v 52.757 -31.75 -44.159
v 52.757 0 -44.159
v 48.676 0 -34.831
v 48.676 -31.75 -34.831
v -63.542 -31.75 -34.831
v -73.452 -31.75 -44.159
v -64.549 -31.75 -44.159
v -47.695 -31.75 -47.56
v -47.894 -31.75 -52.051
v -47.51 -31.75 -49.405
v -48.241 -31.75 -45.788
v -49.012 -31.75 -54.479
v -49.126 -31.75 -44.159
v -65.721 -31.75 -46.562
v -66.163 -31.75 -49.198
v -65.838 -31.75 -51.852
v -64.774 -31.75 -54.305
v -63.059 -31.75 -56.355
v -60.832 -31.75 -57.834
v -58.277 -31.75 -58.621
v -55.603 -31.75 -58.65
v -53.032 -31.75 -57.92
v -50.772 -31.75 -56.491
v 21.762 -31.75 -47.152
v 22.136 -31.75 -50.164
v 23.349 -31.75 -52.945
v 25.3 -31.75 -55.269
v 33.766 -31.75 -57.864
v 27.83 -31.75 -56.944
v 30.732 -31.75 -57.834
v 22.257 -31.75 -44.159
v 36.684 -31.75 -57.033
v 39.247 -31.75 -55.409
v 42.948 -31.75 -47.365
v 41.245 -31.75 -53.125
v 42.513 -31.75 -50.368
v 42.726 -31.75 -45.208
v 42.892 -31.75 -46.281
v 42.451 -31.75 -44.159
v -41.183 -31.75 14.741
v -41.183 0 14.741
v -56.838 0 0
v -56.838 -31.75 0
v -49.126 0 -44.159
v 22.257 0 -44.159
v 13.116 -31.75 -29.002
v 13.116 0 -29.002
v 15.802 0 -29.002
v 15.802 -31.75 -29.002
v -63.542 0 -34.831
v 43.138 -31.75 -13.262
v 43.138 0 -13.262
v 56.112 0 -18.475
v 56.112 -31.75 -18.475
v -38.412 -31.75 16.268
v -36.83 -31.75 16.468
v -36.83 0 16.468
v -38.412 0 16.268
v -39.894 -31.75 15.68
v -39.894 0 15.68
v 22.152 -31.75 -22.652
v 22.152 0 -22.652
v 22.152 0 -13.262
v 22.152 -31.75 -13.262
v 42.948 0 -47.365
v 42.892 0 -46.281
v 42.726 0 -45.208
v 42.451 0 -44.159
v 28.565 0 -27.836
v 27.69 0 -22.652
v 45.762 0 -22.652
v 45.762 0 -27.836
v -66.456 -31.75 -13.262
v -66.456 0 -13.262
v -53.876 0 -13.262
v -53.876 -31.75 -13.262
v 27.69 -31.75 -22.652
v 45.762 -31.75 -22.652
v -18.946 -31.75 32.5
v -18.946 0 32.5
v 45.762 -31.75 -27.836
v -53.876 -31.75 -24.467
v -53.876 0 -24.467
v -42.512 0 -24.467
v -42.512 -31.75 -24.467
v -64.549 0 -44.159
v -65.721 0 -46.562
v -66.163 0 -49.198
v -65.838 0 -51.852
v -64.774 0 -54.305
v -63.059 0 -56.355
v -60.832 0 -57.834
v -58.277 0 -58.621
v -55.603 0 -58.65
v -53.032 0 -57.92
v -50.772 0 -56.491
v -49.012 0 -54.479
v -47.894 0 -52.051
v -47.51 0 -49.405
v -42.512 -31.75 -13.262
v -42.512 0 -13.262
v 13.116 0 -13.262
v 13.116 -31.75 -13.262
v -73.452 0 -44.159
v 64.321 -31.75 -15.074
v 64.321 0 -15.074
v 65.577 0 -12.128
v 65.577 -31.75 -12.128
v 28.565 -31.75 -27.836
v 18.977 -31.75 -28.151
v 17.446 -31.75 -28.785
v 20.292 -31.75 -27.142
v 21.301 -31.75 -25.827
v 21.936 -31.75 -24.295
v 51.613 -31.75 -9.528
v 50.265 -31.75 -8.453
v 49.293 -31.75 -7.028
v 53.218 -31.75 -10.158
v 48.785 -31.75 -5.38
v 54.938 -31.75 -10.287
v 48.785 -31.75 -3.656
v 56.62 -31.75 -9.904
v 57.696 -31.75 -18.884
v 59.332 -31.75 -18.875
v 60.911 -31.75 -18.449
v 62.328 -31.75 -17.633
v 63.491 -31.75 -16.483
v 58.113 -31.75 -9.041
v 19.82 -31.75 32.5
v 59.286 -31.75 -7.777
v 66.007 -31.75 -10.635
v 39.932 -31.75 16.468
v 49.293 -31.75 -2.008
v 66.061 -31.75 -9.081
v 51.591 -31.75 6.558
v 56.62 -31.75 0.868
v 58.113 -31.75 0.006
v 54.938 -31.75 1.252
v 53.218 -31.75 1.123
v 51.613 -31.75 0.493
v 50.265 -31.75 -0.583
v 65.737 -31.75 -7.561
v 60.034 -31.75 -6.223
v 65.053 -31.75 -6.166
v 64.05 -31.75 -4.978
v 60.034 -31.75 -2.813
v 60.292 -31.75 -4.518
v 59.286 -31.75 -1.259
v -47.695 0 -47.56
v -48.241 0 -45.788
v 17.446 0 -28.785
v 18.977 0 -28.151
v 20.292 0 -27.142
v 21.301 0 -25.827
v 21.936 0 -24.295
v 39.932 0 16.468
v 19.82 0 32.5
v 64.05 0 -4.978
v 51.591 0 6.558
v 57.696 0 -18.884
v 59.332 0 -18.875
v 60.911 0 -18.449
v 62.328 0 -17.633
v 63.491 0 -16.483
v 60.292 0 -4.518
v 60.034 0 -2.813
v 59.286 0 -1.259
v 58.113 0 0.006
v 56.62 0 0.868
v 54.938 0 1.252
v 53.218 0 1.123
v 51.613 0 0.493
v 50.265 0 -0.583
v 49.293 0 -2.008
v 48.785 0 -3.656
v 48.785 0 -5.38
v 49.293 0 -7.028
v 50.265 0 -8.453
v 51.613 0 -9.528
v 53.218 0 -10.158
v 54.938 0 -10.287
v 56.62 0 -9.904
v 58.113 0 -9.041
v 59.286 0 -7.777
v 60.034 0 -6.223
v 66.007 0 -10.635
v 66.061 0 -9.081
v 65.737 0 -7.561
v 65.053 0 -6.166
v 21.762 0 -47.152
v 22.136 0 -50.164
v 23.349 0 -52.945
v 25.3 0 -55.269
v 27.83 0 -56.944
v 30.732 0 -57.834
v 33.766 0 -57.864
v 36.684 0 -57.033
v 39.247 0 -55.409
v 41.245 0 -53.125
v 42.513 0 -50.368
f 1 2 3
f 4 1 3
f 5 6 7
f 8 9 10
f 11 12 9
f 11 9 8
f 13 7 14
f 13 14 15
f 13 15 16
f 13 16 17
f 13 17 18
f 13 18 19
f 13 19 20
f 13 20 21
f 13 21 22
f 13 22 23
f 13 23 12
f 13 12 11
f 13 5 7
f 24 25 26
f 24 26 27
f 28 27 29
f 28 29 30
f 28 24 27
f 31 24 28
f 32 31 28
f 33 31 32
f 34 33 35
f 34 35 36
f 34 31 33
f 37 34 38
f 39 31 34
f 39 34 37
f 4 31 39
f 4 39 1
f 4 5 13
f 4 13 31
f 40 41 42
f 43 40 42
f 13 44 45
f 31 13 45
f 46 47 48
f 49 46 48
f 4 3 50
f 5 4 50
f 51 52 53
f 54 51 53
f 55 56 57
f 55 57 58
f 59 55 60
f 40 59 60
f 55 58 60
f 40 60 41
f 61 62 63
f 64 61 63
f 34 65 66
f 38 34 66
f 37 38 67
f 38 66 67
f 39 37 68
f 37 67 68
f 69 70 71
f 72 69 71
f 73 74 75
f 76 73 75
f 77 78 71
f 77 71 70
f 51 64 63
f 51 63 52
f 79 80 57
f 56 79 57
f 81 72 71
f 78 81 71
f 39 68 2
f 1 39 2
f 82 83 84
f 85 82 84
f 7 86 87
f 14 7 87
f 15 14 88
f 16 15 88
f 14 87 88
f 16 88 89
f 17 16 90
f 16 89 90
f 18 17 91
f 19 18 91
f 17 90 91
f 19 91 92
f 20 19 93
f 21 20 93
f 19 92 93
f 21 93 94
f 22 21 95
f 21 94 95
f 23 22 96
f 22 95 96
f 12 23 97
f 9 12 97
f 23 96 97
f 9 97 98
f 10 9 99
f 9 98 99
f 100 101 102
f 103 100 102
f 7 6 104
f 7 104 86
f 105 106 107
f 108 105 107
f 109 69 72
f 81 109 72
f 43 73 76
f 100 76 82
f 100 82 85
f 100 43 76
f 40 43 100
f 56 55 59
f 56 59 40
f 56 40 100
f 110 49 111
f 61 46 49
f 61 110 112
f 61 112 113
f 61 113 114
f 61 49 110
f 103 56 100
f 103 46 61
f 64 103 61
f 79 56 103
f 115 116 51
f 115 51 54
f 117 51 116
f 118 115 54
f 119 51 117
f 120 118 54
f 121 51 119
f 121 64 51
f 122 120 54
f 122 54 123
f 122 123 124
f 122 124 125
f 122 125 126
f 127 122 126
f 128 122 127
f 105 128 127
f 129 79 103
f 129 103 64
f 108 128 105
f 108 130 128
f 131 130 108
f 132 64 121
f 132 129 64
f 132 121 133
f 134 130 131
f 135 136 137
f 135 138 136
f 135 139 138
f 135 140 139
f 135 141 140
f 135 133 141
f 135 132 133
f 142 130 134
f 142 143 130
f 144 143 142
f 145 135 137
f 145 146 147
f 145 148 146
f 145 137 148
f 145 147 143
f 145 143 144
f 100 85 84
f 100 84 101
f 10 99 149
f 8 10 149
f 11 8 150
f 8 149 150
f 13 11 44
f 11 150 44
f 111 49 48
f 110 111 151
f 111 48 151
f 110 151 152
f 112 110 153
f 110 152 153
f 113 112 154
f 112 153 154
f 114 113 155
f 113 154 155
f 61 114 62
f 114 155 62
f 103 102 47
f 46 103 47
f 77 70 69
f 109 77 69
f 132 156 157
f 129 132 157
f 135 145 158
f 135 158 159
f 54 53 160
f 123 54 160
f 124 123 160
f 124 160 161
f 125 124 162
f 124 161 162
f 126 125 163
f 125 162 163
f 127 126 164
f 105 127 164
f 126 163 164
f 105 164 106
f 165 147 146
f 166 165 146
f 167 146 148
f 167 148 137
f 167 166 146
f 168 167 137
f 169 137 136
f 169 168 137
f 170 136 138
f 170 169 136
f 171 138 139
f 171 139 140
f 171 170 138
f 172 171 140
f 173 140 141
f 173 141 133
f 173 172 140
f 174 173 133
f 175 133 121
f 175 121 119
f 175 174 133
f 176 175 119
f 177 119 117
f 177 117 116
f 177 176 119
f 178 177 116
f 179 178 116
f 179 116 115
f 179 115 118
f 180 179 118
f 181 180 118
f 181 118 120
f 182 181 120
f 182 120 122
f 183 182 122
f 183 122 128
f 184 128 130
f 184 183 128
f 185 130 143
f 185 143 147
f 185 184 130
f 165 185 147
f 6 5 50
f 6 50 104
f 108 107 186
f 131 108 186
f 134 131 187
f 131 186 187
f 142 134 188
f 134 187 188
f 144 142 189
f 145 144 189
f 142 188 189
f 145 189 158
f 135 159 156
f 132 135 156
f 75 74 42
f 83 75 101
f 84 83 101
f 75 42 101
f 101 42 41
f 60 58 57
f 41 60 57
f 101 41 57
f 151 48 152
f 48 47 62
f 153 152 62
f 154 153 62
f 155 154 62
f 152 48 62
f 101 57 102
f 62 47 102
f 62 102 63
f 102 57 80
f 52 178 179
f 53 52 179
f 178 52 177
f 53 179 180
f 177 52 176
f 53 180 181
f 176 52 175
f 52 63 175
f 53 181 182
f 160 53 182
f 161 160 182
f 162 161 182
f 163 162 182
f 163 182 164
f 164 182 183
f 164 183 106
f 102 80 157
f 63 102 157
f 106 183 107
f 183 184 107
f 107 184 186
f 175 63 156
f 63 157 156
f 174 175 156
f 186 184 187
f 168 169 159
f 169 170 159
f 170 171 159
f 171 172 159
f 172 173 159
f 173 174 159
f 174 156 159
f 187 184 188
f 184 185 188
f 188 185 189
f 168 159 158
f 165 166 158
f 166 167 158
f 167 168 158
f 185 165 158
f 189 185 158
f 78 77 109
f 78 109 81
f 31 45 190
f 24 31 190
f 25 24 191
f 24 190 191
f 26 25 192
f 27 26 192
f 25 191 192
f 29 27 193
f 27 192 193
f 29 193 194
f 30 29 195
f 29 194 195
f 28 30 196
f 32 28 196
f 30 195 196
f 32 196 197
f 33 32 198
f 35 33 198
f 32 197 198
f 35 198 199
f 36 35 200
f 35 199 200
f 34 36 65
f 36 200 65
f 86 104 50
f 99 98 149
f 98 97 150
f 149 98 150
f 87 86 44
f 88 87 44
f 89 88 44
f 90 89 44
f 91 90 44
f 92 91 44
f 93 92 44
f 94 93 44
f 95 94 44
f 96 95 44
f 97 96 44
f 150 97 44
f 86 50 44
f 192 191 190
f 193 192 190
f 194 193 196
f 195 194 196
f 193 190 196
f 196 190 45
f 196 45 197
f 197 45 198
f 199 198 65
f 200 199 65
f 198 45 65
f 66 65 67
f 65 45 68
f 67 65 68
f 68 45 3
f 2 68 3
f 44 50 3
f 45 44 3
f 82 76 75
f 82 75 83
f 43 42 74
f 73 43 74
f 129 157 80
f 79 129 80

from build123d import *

# Parameters (mm, degrees)
F0_R     = 5.7856185804
F1_DEPTH = 31.75


with BuildPart() as f1:
    # F0 (on Front) → F1 (new body)
    with BuildSketch(Plane.XZ):
        Polygon((-18.945902586, 32.4995070696), (-36.8299595613, 16.4683610201), (-21.8606572598, 16.4683610201), align=None)
        with BuildLine():
            Line((-21.8606572598, 16.4683610201), (-36.8299595613, 16.4683610201))
            ThreePointArc((-36.8299595613, 16.4683610201), (-39.1716298113, 16.0208249497), (-41.1832270213, 14.7412997414))
            Line((-41.1832270213, 14.7412997414), (-56.8377040327, 0))
            Line((-56.8377040327, 0), (-31.4793474972, 0))
            Line((-31.4793474972, 0), (-21.8606572598, 16.4683610201))
        make_face()
        Polygon((-18.945902586, 32.4995070696), (-21.8606572598, 16.4683610201), (0, 16.4683610201), (0, 32.4995070696), align=None)
        Polygon((0, 32.4995070696), (0, 16.4683610201), (18.9459007233, 16.4683610201), (19.8203269392, 32.4995070696), align=None)
        Polygon((-38.1832793355, -13.2621303201), (-31.4793474972, 0), (-56.8377040327, 0), (-66.4563924074, -13.2621303201), (-53.8759827614, -13.2621303201), (-53.8759827614, -24.4669094682), (-42.5122864544, -24.4669094682), (-42.5122864544, -13.2621303201), align=None)
        Polygon((-5.5380342528, 0), (-31.4793474972, 0), (-38.1832793355, -13.2621303201), (-11.6590168327, -13.2621303201), align=None)
        Polygon((19.8203269392, 32.4995070696), (18.9459007233, 16.4683610201), (39.9321317673, 16.4683610201), align=None)
        Polygon((39.9321317673, 16.4683610201), (18.9459007233, 16.4683610201), (14.8652456701, 0), (37.6003272831, 0), align=None)
        Polygon((14.8652456701, 0), (-5.5380342528, 0), (-11.6590168327, -13.2621303201), (13.1163932383, -13.2621303201), align=None)
        Polygon((51.5911467373, 6.5581966192), (39.9321317673, 16.4683610201), (37.6003272831, 0), (47.0716502985, -4.0392414176), align=None)
        with BuildLine():
            Line((37.6003272831, 0), (14.8652456701, 0))
            Line((14.8652456701, 0), (13.1163932383, -13.2621303201))
            Line((13.1163932383, -13.2621303201), (13.1163932383, -29.0018040687))
            Line((13.1163932383, -29.0018040687), (15.8021295607, -29.0018040687))
            ThreePointArc((15.8021295607, -29.0018040687), (20.2922576212, -27.1419321292), (22.1521295607, -22.6518040687))
            Line((22.1521295607, -22.6518040687), (22.1521295607, -13.2621303201))
            Line((22.1521295607, -13.2621303201), (37.6003272831, -13.2621303201))
            Line((37.6003272831, -13.2621303201), (37.6003272831, 0))
        make_face()
        with BuildLine():
            Line((64.0501111657, -4.9778790706), (51.5911467373, 6.5581966192))
            Line((51.5911467373, 6.5581966192), (47.0716502985, -4.0392414176))
            Line((47.0716502985, -4.0392414176), (43.138358742, -13.2621303201))
            Line((43.138358742, -13.2621303201), (56.1124610001, -18.4747663982))
            ThreePointArc((56.1124610001, -18.4747663982), (60.9105624975, -18.4488796975), (64.3207964297, -15.0735645081))
            Line((64.3207964297, -15.0735645081), (65.5768751944, -12.1282768949))
            ThreePointArc((65.5768751944, -12.1282768949), (65.9458865804, -8.3112875884), (64.0501111657, -4.9778790706))
        make_face()
        with Locations((54.5058995485, -4.5178690925)):
            Circle(F0_R, mode=Mode.SUBTRACT)
        Polygon((47.0716502985, -4.0392414176), (37.6003272831, 0), (37.6003272831, -13.2621303201), (43.138358742, -13.2621303201), align=None)
        Polygon((0, 16.4683610201), (-21.8606572598, 16.4683610201), (-31.4793474972, 0), (-5.5380342528, 0), align=None)
        Polygon((18.9459007233, 16.4683610201), (0, 16.4683610201), (-5.5380342528, 0), (14.8652456701, 0), align=None)
    extrude(amount=F1_DEPTH)


with BuildPart() as f1b:
    # F0 (on Front) → F1, piece 2 (new body)
    with BuildSketch(Plane.XZ):
        with BuildLine():
            Line((48.6763902009, -34.8313115537), (-63.5416433215, -34.8313115537))
            Line((-63.5416433215, -34.8313115537), (-73.4518021345, -44.1585220397))
            Line((-73.4518021345, -44.1585220397), (-64.5494128515, -44.1585220397))
            ThreePointArc((-64.5494128515, -44.1585220397), (-56.8377040327, -40.0778725743), (-49.1259952139, -44.1585220397))
            Line((-49.1259952139, -44.1585220397), (22.256773577, -44.1585220397))
            ThreePointArc((22.256773577, -44.1585220397), (32.3537737131, -36.7709183512), (42.4507738492, -44.1585220397))
            Line((42.4507738492, -44.1585220397), (52.7570471168, -44.1585220397))
            Line((52.7570471168, -44.1585220397), (48.6763902009, -34.8313115537))
        make_face()
        with BuildLine():
            ThreePointArc((-49.1259952139, -44.1585220397), (-56.8377040327, -40.0778725743), (-64.5494128515, -44.1585220397))
            Line((-64.5494128515, -44.1585220397), (-49.1259952139, -44.1585220397))
        make_face()
        with BuildLine():
            Line((-49.1259952139, -44.1585220397), (-64.5494128515, -44.1585220397))
            ThreePointArc((-64.5494128515, -44.1585220397), (-59.5825286254, -58.3192736239), (-47.5104935467, -49.4050830603))
            ThreePointArc((-47.5104935467, -49.4050830603), (-47.9235134691, -46.6602584675), (-49.1259952139, -44.1585220397))
        make_face()
        with BuildLine():
            ThreePointArc((42.9476081015, -47.3647527397), (42.8226627256, -45.7425043327), (42.4507738492, -44.1585220397))
            Line((42.4507738492, -44.1585220397), (22.256773577, -44.1585220397))
            ThreePointArc((22.256773577, -44.1585220397), (30.7315253061, -57.8336417521), (42.9476081015, -47.3647527397))
        make_face()
        with BuildLine():
            Line((22.256773577, -44.1585220397), (42.4507738492, -44.1585220397))
            ThreePointArc((42.4507738492, -44.1585220397), (32.3537737131, -36.7709183512), (22.256773577, -44.1585220397))
        make_face()
    extrude(amount=F1_DEPTH)


with BuildPart() as f1c:
    # F0 (on Front) → F1, piece 3 (new body)
    with BuildSketch(Plane.XZ):
        Polygon((45.7616373897, -22.6518040687), (27.6901666075, -22.6518040687), (28.5645928234, -27.8359018266), (45.7616373897, -27.8359018266), align=None)
    extrude(amount=F1_DEPTH)


solid = Compound([f1.part, f1b.part, f1c.part])
